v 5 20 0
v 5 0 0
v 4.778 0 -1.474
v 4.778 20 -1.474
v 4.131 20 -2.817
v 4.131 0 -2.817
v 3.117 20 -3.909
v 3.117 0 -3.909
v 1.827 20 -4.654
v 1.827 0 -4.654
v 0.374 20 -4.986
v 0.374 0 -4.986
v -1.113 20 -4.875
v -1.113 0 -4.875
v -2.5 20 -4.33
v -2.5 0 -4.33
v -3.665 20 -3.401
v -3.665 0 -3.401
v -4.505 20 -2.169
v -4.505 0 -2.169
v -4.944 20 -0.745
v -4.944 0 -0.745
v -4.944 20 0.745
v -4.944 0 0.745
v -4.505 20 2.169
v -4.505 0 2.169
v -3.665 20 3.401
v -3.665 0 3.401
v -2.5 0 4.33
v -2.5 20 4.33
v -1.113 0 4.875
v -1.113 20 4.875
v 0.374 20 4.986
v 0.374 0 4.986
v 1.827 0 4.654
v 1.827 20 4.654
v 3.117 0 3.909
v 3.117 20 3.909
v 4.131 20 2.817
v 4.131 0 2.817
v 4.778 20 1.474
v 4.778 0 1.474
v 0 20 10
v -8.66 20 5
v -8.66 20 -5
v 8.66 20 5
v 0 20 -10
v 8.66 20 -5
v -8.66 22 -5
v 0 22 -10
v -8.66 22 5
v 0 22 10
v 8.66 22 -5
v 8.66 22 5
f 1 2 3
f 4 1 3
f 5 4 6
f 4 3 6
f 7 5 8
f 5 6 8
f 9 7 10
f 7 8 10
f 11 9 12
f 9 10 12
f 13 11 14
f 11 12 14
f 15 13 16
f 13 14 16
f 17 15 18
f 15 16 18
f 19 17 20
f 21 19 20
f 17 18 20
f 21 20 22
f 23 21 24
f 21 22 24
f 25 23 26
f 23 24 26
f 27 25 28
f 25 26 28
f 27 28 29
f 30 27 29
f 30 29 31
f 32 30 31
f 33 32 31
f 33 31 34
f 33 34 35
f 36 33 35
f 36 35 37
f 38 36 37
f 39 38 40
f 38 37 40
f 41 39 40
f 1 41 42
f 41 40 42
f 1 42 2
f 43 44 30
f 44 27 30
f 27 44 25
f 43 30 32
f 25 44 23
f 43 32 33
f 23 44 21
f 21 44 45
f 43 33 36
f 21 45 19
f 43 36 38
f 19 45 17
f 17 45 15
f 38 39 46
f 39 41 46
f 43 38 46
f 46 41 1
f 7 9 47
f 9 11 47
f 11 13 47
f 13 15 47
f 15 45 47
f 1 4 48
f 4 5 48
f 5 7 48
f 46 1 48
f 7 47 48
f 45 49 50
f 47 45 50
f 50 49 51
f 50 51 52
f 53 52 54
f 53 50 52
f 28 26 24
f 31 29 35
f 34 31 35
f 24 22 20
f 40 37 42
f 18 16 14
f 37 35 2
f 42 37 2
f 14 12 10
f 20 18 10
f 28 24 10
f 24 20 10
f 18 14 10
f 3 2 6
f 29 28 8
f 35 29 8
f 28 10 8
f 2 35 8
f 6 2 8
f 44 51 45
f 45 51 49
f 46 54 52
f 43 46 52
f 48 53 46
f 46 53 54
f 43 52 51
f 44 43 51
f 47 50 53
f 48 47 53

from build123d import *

# Parameters (mm, degrees)
SKETCH1_R           = 5
BOSS_EXTRUDE1_DEPTH = 20
SKETCH2_R           = 10
BOSS_EXTRUDE2_DEPTH = 2
SKETCH3_OUTSIDE_W   = 29.166
SKETCH3_OUTSIDE_H   = 29.166
CUT_EXTRUDE1_DEPTH  = 2


with BuildPart() as part:
    # Sketch1 → Boss-Extrude1 (new body)
    with BuildSketch(Plane(origin=(0, 0, 0), x_dir=(1, 0, 0), z_dir=(0, 1, 0))):
        Circle(SKETCH1_R)
    extrude(amount=BOSS_EXTRUDE1_DEPTH)

    # Sketch2 → Boss-Extrude2 (add)
    with BuildSketch(Plane(origin=(0, 20, 0), x_dir=(1, 0, 0), z_dir=(0, 1, 0))):
        Circle(SKETCH2_R)
    extrude(amount=BOSS_EXTRUDE2_DEPTH)

    # Sketch3 outside → Cut-Extrude1 (cut)
    with BuildSketch(Plane(origin=(0, 22, 0), x_dir=(1, 0, 0), z_dir=(0, 1, 0))):
        Rectangle(SKETCH3_OUTSIDE_W, SKETCH3_OUTSIDE_H)
        Polygon((0, 10), (8.660254038, 5), (8.660254038, -5), (0, -10), (-8.660254038, -5), (-8.660254038, 5), align=None, mode=Mode.SUBTRACT)
    extrude(amount=-CUT_EXTRUDE1_DEPTH, mode=Mode.SUBTRACT)


solid = part.part
